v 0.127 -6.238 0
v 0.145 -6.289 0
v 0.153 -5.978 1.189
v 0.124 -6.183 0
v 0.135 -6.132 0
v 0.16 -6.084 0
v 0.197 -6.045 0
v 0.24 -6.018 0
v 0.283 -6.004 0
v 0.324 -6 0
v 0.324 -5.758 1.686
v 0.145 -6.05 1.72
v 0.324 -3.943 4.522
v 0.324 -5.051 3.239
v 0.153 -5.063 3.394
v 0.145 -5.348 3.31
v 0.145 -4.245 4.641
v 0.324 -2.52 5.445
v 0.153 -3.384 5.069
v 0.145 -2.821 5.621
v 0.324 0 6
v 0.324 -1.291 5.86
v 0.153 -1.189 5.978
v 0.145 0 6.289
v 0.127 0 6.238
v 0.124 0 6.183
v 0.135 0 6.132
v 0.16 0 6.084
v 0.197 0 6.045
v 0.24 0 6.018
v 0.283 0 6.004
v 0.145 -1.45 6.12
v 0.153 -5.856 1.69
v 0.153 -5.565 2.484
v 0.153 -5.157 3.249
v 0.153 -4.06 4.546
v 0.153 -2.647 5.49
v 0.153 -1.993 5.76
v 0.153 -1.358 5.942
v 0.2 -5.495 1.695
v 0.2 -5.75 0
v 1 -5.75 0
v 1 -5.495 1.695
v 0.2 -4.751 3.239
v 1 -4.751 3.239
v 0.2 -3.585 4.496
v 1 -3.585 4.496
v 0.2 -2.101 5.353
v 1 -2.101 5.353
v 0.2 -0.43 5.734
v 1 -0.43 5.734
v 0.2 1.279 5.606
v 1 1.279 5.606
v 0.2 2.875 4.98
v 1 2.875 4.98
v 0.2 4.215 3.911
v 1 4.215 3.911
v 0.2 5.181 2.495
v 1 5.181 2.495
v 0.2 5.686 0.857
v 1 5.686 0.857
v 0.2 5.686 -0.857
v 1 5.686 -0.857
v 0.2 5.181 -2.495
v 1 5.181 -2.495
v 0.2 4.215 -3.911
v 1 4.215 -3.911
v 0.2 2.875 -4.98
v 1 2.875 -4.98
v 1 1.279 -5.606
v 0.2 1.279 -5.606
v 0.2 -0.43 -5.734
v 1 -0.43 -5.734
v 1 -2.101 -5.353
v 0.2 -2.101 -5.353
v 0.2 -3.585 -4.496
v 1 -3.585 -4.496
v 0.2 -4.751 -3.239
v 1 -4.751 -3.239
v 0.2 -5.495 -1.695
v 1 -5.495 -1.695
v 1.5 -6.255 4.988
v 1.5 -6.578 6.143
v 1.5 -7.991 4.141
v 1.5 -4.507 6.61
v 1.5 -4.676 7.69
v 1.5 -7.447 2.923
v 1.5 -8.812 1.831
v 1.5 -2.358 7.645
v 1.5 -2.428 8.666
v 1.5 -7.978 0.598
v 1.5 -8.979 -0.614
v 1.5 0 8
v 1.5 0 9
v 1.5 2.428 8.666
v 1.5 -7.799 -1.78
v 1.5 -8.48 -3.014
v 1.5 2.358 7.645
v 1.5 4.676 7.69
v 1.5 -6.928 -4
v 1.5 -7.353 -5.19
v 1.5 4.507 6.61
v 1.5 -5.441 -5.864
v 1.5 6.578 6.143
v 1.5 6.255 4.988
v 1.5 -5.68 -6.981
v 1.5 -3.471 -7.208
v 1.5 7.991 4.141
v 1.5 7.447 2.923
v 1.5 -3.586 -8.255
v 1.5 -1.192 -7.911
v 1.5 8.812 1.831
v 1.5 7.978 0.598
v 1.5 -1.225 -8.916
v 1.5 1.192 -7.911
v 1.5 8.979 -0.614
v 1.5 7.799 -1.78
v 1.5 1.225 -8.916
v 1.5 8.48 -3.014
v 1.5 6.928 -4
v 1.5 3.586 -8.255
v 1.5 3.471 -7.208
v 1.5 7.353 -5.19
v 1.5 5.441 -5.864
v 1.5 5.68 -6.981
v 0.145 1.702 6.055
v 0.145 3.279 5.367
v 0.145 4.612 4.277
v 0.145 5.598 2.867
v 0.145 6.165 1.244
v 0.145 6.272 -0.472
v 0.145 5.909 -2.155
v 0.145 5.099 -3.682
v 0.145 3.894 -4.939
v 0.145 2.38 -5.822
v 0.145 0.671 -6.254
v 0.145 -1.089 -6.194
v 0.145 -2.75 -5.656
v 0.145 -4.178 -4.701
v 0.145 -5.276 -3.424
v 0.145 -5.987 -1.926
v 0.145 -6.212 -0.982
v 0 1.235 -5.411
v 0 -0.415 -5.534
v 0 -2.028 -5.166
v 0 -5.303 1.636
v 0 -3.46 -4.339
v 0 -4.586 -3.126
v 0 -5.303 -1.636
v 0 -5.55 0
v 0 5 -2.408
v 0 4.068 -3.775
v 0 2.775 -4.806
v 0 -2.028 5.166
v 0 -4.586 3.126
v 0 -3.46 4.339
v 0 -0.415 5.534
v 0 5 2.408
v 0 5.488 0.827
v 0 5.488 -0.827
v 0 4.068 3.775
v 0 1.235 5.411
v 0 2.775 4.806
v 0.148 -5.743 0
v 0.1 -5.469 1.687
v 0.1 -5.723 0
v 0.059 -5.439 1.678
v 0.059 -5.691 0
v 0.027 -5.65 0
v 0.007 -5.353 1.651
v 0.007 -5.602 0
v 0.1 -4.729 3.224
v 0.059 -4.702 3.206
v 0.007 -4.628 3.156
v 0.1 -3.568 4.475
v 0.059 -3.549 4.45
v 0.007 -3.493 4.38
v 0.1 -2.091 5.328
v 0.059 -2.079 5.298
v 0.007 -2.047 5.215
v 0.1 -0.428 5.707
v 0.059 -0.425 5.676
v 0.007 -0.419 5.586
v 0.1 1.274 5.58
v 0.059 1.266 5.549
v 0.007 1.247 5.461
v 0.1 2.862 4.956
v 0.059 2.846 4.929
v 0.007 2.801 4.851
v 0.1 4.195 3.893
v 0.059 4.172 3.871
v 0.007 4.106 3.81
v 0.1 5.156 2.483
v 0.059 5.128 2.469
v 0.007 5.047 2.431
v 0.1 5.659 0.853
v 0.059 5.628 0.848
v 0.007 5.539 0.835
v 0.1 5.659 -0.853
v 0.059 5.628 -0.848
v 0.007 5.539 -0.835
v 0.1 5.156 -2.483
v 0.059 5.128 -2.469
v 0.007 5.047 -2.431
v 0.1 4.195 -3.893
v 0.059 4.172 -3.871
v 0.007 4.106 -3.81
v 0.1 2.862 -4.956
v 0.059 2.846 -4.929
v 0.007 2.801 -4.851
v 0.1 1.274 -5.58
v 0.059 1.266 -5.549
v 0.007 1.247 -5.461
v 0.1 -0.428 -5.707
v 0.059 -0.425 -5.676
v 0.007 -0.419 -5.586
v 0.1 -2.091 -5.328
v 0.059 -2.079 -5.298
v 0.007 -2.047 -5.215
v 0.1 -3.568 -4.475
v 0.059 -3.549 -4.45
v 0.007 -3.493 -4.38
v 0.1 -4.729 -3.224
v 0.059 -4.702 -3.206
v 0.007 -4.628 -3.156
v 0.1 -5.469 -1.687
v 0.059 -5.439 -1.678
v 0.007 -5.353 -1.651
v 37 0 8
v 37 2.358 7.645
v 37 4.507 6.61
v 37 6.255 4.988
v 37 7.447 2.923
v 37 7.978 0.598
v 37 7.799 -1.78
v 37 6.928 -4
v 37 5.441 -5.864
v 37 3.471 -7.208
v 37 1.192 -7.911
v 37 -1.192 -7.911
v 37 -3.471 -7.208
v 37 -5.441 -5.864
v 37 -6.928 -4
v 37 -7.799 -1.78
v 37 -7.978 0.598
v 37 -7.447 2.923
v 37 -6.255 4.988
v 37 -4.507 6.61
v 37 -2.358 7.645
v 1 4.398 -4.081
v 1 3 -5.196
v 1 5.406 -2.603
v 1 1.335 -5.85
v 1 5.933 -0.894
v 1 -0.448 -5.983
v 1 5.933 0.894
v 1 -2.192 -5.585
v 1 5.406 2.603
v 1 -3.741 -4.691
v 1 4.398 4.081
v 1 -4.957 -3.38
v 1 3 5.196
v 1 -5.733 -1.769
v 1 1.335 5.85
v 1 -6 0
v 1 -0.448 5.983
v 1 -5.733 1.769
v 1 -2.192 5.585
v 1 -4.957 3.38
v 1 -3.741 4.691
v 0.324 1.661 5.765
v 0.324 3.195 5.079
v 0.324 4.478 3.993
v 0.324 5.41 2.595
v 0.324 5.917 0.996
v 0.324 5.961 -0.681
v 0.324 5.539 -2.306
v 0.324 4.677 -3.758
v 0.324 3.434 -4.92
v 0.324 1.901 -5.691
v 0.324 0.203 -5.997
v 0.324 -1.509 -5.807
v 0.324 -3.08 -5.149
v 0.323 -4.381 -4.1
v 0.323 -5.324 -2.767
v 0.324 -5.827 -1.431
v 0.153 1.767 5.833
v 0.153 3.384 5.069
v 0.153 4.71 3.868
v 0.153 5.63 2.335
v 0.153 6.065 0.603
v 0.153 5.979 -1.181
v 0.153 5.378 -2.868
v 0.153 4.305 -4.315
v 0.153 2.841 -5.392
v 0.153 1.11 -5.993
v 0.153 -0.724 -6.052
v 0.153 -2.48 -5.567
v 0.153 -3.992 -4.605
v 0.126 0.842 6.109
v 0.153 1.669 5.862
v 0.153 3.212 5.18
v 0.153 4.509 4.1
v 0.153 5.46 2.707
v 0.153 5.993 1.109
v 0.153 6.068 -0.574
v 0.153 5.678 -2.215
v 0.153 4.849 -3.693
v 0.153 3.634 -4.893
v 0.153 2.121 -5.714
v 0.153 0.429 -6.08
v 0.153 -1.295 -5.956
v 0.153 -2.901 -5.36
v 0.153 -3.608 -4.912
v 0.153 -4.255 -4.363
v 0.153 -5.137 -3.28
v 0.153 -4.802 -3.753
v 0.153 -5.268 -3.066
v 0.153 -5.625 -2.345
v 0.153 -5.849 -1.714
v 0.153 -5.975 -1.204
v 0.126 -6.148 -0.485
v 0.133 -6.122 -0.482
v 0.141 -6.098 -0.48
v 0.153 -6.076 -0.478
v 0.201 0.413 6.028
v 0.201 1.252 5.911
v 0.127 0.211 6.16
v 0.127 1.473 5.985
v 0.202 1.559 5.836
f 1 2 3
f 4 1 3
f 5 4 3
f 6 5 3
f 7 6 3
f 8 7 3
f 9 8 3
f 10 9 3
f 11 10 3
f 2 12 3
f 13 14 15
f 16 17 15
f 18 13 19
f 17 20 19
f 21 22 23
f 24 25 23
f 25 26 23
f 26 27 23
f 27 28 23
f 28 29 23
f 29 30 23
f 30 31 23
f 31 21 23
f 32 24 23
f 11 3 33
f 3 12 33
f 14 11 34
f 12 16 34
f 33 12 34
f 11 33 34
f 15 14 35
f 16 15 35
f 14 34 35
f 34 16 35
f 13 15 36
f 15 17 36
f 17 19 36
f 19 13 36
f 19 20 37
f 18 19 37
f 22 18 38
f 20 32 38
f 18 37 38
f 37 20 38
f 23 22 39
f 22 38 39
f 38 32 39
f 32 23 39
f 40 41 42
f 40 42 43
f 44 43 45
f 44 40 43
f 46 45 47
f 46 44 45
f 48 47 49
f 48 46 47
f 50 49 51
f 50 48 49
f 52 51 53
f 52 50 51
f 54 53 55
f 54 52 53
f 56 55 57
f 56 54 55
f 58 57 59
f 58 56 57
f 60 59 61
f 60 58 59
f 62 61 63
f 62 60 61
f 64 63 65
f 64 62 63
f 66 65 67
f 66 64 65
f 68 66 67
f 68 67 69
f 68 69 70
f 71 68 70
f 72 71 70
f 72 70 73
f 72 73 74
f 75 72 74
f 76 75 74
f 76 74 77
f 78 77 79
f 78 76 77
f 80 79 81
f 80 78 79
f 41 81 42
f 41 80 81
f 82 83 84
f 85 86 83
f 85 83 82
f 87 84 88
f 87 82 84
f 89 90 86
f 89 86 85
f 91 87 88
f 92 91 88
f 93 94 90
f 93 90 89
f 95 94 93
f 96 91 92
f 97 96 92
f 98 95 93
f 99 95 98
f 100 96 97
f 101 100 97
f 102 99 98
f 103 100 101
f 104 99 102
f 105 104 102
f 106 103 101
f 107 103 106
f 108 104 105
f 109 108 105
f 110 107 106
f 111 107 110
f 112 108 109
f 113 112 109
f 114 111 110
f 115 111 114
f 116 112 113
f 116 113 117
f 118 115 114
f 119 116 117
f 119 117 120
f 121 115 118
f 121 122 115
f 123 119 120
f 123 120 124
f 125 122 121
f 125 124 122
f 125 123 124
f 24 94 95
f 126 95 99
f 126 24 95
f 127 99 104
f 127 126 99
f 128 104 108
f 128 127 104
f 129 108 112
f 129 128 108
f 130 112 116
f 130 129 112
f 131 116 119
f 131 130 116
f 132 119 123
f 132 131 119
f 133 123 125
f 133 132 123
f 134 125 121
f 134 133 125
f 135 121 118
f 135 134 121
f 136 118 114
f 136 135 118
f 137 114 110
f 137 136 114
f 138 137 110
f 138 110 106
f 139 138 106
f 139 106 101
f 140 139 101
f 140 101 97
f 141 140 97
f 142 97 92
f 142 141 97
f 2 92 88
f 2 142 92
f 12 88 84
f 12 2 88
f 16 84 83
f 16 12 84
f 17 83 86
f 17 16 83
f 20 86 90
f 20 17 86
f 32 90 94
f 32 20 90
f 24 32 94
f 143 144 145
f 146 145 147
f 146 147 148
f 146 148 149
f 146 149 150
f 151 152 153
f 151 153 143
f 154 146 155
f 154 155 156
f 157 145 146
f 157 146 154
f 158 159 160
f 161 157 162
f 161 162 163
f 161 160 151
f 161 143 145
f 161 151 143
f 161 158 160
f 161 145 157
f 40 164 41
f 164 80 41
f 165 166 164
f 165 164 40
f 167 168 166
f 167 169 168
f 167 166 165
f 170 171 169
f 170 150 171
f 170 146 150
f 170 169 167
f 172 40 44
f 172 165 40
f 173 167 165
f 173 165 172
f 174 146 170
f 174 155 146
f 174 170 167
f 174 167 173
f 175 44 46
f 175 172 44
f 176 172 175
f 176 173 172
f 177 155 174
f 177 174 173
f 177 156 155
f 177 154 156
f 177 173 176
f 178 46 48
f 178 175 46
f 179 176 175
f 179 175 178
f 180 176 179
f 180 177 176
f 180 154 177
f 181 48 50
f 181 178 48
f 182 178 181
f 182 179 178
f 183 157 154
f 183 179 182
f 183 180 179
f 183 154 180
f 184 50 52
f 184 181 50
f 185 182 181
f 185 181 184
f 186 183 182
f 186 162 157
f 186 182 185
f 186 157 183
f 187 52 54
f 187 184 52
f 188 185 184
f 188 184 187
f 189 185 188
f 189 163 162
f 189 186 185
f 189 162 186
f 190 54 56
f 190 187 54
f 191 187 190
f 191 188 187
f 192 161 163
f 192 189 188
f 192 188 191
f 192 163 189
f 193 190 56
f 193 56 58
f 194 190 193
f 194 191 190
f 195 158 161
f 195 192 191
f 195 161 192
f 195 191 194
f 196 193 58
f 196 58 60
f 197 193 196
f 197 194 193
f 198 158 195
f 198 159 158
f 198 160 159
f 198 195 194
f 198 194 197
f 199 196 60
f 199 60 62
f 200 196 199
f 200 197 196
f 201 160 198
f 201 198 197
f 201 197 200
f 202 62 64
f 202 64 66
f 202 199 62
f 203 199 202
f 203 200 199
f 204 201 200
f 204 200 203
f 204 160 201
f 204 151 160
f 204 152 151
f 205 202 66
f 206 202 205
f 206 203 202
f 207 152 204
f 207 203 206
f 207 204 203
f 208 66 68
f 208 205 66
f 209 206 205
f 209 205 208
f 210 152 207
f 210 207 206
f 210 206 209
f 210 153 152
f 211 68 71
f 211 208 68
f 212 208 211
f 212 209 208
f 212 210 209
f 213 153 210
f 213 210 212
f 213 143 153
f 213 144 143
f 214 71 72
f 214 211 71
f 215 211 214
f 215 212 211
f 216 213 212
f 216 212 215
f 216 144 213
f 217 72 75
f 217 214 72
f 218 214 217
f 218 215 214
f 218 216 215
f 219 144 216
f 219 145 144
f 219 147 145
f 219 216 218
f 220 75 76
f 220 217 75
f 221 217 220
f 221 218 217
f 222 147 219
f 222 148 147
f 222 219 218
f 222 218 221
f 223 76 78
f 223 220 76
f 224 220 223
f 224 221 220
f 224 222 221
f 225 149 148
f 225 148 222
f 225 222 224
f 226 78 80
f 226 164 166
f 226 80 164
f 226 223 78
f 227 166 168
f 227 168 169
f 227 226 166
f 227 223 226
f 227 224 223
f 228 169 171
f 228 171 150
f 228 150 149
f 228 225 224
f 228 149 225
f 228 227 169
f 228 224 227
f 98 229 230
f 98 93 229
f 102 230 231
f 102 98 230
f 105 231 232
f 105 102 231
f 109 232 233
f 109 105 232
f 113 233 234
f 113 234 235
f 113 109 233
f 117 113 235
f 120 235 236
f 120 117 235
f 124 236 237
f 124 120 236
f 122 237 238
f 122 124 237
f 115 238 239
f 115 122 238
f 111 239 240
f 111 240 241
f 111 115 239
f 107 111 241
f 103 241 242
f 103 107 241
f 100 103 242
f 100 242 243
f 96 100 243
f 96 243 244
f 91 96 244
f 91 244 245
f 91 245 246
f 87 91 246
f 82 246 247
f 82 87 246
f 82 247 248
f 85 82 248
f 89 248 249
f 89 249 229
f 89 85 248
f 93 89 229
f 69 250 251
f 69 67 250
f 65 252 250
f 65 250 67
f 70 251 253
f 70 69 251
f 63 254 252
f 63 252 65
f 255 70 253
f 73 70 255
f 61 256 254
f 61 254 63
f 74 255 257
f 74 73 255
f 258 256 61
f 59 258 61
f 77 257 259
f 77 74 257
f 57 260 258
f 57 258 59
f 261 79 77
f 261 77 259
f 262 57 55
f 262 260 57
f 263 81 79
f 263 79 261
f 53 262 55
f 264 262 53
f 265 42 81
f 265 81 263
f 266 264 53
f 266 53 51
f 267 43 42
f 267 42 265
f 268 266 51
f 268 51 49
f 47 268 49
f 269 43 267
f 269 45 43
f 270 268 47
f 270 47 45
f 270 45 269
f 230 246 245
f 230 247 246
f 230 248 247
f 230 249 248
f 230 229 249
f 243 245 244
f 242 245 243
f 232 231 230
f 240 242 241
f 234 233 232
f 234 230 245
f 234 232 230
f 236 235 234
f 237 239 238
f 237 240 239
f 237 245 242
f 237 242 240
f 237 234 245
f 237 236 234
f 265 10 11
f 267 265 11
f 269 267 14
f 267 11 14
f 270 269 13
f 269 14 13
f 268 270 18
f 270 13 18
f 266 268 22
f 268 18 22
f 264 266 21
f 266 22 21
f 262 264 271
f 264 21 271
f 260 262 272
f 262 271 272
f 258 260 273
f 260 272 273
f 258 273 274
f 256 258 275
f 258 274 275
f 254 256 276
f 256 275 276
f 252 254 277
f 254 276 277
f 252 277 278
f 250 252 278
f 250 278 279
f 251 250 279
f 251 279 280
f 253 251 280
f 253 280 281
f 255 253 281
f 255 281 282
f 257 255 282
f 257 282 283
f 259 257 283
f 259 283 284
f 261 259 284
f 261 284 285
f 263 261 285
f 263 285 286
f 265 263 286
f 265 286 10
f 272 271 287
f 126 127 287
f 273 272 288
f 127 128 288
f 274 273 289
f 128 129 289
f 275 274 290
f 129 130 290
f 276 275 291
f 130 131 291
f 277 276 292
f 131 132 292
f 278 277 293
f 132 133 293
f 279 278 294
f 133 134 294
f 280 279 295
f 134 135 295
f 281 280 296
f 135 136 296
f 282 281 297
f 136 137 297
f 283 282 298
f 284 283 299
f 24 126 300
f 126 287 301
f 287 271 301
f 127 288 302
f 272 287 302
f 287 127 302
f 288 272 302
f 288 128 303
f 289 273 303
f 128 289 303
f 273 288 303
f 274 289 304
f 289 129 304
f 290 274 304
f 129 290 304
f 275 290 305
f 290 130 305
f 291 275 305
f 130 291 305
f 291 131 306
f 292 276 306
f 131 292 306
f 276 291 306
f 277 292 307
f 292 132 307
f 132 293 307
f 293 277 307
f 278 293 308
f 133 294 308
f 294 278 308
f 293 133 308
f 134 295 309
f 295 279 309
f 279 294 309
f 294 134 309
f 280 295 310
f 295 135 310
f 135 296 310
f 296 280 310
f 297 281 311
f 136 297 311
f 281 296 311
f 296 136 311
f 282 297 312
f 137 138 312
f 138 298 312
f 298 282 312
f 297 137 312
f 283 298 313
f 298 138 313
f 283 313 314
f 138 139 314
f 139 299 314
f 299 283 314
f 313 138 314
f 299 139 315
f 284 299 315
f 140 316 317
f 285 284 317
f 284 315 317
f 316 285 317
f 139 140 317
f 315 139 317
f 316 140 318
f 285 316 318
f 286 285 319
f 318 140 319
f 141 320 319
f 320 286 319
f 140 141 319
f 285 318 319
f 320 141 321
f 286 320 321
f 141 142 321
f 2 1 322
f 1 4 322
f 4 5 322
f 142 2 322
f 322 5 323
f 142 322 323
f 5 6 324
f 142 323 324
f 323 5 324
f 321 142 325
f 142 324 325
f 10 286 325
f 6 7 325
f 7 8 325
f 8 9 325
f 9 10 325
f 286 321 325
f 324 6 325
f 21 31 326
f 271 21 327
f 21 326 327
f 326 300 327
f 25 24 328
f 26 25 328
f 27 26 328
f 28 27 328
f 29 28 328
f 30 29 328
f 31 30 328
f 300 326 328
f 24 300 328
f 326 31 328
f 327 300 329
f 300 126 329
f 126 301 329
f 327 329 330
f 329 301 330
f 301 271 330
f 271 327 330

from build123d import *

# Parameters (mm, degrees)
F2_R     = 6
F2_R_2   = 5.75
F3_DEPTH = 1
F4_R     = 0.2


with BuildPart() as f1:
    # F0 (on Front) → F1 (revolve)
    with BuildSketch(Plane.XZ):
        Polygon((0, 6), (0, 0), (37, 0), (37, 8), (1.5, 8), (1.5, 9), align=None)
    revolve(axis=Axis((18.5, 0, 0), (-1, 0, 0)))

    # F2 (on face) → F3 (cut)
    with BuildSketch(Plane(origin=(0, 0, 0), x_dir=(0, -1, 0), z_dir=(-1, 0, 0))):
        Circle(F2_R)
        Circle(F2_R_2, mode=Mode.SUBTRACT)
    extrude(amount=-F3_DEPTH, mode=Mode.SUBTRACT)

    # F4
    f4_edges = [f1.edges().sort_by_distance(p)[0] for p in [
        (0, 4.242641, -4.242641),
        (0, -4.242641, 4.242641),
        (0, 5.75, 0),
    ]]
    fillet(f4_edges, radius=F4_R)


solid = f1.part
